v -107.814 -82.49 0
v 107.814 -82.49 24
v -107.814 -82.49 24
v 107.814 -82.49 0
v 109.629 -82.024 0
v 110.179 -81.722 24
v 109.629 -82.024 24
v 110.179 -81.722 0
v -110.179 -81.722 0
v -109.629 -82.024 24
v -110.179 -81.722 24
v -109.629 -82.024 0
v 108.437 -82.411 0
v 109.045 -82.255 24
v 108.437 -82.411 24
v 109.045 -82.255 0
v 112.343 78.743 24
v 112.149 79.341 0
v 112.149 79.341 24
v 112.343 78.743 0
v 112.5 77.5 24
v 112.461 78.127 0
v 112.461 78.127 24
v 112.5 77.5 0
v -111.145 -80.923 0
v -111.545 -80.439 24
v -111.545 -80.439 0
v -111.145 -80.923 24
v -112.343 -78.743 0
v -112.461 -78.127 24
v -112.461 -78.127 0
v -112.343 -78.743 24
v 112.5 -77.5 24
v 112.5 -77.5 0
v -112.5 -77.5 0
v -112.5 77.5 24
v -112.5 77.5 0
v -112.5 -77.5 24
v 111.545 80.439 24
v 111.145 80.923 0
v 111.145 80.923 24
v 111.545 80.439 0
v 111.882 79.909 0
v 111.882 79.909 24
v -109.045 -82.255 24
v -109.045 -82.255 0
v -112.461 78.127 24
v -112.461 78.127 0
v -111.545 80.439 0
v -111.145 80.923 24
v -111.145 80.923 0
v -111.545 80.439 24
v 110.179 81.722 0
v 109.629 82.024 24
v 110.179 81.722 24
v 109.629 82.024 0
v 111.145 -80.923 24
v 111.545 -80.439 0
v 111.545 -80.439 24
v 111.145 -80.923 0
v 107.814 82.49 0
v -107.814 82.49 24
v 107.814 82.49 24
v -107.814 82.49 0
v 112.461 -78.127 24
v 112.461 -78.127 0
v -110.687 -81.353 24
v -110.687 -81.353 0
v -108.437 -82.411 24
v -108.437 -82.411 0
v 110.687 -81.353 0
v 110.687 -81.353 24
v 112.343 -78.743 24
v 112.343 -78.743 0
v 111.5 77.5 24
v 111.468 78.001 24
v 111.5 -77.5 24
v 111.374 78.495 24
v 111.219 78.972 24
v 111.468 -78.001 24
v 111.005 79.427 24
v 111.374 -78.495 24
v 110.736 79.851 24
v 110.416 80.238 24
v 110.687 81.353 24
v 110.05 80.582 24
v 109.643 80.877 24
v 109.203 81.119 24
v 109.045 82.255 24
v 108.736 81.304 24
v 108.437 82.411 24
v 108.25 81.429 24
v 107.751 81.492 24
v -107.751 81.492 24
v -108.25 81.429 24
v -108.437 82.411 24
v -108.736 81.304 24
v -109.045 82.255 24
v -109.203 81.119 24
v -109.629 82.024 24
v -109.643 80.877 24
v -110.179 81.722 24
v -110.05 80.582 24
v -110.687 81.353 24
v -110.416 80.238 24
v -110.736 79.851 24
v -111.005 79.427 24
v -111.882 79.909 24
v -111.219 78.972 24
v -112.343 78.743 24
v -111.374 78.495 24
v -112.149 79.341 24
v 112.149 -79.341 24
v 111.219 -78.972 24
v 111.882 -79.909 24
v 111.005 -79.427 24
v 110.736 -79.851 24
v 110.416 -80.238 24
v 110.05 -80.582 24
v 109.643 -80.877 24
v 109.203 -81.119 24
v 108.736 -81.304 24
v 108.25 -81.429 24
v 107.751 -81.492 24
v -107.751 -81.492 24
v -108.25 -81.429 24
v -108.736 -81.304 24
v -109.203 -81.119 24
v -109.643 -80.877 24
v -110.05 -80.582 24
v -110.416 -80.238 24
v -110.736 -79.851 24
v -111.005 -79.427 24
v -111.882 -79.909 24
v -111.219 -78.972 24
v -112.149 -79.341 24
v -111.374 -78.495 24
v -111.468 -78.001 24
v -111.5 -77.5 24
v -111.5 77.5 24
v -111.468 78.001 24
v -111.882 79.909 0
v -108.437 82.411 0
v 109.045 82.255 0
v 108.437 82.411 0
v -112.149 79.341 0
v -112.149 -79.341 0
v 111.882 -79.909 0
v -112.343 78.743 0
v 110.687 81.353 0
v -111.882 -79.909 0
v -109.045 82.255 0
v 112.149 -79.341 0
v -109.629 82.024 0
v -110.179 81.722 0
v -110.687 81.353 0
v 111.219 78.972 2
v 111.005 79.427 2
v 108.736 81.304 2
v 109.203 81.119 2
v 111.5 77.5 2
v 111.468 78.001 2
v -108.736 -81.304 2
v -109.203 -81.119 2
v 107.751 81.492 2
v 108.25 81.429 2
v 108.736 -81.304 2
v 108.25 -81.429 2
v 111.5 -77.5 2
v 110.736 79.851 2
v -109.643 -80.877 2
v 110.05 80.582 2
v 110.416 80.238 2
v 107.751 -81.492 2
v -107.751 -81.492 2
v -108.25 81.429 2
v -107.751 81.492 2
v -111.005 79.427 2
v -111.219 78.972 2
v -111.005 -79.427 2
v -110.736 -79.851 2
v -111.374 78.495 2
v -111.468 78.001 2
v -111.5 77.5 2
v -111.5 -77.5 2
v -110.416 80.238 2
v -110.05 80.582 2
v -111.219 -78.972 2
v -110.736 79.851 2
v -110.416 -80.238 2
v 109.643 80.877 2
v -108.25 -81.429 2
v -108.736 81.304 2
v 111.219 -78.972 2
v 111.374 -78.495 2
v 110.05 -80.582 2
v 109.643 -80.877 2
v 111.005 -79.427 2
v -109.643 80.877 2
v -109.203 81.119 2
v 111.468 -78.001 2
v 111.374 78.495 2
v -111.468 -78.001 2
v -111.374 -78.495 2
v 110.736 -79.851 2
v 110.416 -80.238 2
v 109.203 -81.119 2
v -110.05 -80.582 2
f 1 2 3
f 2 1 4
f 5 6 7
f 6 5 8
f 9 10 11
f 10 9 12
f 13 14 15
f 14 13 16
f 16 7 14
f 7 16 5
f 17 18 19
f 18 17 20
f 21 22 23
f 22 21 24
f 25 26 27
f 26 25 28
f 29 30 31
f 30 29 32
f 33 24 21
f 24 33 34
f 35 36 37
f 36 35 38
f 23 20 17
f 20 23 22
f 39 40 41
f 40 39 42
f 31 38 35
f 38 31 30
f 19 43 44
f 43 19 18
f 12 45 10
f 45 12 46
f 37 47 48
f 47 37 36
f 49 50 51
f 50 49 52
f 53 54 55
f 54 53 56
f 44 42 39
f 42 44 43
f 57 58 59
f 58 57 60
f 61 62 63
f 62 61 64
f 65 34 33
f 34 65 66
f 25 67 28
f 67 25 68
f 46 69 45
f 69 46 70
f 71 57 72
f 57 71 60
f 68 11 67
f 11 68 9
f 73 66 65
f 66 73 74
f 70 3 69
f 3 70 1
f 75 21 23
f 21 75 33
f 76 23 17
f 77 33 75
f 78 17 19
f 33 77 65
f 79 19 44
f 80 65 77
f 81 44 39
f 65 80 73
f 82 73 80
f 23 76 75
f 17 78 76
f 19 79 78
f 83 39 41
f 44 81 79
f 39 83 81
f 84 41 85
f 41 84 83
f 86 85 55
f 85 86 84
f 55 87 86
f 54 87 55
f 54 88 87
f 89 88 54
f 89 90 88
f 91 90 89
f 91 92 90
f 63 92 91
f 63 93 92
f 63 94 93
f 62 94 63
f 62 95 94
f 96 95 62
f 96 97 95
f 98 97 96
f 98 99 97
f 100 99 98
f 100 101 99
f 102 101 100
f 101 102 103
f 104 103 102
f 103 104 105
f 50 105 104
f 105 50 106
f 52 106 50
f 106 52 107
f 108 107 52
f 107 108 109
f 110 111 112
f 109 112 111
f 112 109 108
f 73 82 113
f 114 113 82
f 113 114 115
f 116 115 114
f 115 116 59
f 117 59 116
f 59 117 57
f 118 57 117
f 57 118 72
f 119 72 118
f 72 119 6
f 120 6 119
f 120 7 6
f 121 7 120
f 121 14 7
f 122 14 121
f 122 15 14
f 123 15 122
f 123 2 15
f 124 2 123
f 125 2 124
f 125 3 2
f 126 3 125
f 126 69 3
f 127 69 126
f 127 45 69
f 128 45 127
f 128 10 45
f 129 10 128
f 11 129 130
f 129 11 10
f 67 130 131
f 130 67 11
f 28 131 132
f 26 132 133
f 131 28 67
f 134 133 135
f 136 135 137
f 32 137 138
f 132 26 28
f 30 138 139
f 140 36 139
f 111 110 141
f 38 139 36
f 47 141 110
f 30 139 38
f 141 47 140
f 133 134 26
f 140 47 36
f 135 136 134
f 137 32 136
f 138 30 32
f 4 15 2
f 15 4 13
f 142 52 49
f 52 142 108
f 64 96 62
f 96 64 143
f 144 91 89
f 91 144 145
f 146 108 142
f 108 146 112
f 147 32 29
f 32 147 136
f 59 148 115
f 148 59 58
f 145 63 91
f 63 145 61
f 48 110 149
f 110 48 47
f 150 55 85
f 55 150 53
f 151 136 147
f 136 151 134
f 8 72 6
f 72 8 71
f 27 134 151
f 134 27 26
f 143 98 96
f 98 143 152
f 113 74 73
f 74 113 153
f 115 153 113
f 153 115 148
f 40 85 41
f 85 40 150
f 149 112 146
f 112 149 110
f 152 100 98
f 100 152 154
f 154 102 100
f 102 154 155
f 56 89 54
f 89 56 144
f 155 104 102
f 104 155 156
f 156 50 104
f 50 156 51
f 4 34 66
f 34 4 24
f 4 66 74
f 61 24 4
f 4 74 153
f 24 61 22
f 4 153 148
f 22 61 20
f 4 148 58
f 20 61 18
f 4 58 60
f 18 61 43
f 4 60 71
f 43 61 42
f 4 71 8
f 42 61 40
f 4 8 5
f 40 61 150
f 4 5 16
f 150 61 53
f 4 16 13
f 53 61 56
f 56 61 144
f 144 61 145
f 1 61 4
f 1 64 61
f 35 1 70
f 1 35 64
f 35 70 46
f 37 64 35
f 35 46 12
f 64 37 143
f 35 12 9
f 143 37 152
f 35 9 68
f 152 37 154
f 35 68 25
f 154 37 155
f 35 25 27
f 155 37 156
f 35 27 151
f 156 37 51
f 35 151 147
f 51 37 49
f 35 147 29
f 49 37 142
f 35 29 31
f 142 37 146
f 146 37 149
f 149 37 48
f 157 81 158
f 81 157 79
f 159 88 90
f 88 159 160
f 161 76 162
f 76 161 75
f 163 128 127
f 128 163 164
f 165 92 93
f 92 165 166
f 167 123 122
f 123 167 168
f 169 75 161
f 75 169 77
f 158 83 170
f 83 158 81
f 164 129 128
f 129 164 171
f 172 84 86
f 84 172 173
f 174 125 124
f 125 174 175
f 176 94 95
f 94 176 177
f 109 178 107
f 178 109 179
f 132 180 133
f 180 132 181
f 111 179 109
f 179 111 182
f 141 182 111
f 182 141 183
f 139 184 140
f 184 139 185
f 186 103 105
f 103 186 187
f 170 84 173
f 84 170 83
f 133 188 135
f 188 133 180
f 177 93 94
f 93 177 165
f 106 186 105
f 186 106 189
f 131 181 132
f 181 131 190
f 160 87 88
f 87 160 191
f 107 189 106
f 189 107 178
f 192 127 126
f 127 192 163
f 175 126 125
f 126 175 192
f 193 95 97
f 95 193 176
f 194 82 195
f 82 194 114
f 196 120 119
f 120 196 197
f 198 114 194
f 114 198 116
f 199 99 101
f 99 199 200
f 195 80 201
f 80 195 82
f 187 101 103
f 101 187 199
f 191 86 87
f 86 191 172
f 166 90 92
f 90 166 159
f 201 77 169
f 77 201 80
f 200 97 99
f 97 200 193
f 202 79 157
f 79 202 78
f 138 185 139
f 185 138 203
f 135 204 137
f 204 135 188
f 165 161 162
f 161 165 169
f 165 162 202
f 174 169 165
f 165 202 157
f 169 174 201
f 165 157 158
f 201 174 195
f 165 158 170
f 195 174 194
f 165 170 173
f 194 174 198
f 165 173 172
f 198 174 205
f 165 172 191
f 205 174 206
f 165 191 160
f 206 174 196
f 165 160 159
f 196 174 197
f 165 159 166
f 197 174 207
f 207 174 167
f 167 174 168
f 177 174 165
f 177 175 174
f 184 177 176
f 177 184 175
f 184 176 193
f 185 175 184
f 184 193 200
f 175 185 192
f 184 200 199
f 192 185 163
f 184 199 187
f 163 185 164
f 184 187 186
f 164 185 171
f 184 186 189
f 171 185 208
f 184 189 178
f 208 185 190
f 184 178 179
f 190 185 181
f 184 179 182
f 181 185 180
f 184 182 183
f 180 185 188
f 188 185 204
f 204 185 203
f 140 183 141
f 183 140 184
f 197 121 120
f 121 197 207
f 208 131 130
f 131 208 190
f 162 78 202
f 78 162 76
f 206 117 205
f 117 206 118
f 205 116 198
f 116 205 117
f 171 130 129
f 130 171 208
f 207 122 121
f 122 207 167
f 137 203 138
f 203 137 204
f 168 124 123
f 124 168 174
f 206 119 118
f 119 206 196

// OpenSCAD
$fn = 50;


difference() {
	union() {
		hull() {
			translate(v = [-107.5000000000, 77.5000000000, 0]) {
				cylinder(h = 24, r = 5);
			}
			translate(v = [107.5000000000, 77.5000000000, 0]) {
				cylinder(h = 24, r = 5);
			}
			translate(v = [-107.5000000000, -77.5000000000, 0]) {
				cylinder(h = 24, r = 5);
			}
			translate(v = [107.5000000000, -77.5000000000, 0]) {
				cylinder(h = 24, r = 5);
			}
		}
	}
	union() {
		translate(v = [0, 0, 2]) {
			hull() {
				translate(v = [-107.5000000000, 77.5000000000, 0]) {
					cylinder(h = 22, r = 4);
				}
				translate(v = [107.5000000000, 77.5000000000, 0]) {
					cylinder(h = 22, r = 4);
				}
				translate(v = [-107.5000000000, -77.5000000000, 0]) {
					cylinder(h = 22, r = 4);
				}
				translate(v = [107.5000000000, -77.5000000000, 0]) {
					cylinder(h = 22, r = 4);
				}
			}
		}
	}
}
